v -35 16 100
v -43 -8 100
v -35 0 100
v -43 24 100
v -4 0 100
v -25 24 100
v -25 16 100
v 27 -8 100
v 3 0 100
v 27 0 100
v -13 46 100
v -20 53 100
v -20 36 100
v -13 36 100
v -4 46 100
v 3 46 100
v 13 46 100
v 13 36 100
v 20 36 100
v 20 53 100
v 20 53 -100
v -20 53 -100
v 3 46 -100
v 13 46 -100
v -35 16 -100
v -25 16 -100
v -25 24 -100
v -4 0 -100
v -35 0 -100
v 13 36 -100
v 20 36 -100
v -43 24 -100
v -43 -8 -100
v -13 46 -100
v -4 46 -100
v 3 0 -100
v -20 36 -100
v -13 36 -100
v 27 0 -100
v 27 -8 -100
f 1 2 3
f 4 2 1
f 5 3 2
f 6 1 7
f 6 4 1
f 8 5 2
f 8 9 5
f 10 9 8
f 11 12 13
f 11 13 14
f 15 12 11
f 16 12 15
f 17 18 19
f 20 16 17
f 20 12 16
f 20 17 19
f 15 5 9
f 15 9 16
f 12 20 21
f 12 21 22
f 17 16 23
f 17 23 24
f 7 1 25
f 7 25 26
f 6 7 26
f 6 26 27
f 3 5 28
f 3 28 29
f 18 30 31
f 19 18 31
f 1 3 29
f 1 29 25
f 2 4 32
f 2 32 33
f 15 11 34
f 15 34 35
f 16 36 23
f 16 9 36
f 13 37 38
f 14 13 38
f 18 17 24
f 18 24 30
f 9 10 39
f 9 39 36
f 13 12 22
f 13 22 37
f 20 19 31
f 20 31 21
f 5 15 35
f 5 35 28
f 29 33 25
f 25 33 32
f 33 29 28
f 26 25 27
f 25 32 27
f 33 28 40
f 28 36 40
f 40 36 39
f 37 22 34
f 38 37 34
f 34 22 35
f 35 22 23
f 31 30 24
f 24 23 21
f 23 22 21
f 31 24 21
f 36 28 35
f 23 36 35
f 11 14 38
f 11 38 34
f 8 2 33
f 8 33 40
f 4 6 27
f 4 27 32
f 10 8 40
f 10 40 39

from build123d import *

# Parameters (mm, degrees)
SKETCH_1_W          = 3
SKETCH_1_H          = 46
SKETCH_1_W_2        = 4
SKETCH_1_H_2        = 4
EXTRUDE_1_DEPTH     = 100
SKETCH_2_W          = 8
SKETCH_2_H          = 8
CUT_EXTRUDE_1_DEPTH = 212.324395184


with BuildPart() as part:
    # Эскиз1 → Бобышка-Вытянуть1 (new, symmetric)
    with BuildSketch(Plane.XY):
        with Locations((1.5, 23)):
            Rectangle(SKETCH_1_W, SKETCH_1_H)
        with Locations((-2, 23)):
            Rectangle(SKETCH_1_W_2, SKETCH_1_H)
        Polygon((-4, 50), (0, 50), (3, 50), (17, 50), (17, 36), (20, 36), (20, 53), (0, 53), (-20, 53), (-20, 36), (-17, 36), (-17, 50), align=None)
        with Locations((-2, 48)):
            Rectangle(SKETCH_1_W_2, SKETCH_1_H_2)
        Polygon((-13, 46), (-4, 46), (-4, 50), (-17, 50), (-17, 36), (-13, 36), align=None)
        Polygon((3, 50), (3, 46), (13, 46), (13, 36), (17, 36), (17, 50), align=None)
        with Locations((1.5, 48)):
            Rectangle(SKETCH_1_W, SKETCH_1_H_2)
        Polygon((3, 0), (0, 0), (-4, 0), (-35, 0), (-35, 16), (-25, 16), (-25, 20), (-39, 20), (-39, -4), (35, -4), (35, 0), align=None)
        Polygon((35, -8), (35, -4), (-39, -4), (-39, 20), (-25, 20), (-25, 24), (-43, 24), (-43, -8), align=None)
    extrude(amount=EXTRUDE_1_DEPTH, both=True)

    # Эскиз2 → Вырез-Вытянуть1 (cut, through all)
    with BuildSketch(Plane.XY.offset(100)):
        with Locations((31, -4)):
            Rectangle(SKETCH_2_W, SKETCH_2_H)
    extrude(amount=-CUT_EXTRUDE_1_DEPTH, mode=Mode.SUBTRACT)


solid = part.part
